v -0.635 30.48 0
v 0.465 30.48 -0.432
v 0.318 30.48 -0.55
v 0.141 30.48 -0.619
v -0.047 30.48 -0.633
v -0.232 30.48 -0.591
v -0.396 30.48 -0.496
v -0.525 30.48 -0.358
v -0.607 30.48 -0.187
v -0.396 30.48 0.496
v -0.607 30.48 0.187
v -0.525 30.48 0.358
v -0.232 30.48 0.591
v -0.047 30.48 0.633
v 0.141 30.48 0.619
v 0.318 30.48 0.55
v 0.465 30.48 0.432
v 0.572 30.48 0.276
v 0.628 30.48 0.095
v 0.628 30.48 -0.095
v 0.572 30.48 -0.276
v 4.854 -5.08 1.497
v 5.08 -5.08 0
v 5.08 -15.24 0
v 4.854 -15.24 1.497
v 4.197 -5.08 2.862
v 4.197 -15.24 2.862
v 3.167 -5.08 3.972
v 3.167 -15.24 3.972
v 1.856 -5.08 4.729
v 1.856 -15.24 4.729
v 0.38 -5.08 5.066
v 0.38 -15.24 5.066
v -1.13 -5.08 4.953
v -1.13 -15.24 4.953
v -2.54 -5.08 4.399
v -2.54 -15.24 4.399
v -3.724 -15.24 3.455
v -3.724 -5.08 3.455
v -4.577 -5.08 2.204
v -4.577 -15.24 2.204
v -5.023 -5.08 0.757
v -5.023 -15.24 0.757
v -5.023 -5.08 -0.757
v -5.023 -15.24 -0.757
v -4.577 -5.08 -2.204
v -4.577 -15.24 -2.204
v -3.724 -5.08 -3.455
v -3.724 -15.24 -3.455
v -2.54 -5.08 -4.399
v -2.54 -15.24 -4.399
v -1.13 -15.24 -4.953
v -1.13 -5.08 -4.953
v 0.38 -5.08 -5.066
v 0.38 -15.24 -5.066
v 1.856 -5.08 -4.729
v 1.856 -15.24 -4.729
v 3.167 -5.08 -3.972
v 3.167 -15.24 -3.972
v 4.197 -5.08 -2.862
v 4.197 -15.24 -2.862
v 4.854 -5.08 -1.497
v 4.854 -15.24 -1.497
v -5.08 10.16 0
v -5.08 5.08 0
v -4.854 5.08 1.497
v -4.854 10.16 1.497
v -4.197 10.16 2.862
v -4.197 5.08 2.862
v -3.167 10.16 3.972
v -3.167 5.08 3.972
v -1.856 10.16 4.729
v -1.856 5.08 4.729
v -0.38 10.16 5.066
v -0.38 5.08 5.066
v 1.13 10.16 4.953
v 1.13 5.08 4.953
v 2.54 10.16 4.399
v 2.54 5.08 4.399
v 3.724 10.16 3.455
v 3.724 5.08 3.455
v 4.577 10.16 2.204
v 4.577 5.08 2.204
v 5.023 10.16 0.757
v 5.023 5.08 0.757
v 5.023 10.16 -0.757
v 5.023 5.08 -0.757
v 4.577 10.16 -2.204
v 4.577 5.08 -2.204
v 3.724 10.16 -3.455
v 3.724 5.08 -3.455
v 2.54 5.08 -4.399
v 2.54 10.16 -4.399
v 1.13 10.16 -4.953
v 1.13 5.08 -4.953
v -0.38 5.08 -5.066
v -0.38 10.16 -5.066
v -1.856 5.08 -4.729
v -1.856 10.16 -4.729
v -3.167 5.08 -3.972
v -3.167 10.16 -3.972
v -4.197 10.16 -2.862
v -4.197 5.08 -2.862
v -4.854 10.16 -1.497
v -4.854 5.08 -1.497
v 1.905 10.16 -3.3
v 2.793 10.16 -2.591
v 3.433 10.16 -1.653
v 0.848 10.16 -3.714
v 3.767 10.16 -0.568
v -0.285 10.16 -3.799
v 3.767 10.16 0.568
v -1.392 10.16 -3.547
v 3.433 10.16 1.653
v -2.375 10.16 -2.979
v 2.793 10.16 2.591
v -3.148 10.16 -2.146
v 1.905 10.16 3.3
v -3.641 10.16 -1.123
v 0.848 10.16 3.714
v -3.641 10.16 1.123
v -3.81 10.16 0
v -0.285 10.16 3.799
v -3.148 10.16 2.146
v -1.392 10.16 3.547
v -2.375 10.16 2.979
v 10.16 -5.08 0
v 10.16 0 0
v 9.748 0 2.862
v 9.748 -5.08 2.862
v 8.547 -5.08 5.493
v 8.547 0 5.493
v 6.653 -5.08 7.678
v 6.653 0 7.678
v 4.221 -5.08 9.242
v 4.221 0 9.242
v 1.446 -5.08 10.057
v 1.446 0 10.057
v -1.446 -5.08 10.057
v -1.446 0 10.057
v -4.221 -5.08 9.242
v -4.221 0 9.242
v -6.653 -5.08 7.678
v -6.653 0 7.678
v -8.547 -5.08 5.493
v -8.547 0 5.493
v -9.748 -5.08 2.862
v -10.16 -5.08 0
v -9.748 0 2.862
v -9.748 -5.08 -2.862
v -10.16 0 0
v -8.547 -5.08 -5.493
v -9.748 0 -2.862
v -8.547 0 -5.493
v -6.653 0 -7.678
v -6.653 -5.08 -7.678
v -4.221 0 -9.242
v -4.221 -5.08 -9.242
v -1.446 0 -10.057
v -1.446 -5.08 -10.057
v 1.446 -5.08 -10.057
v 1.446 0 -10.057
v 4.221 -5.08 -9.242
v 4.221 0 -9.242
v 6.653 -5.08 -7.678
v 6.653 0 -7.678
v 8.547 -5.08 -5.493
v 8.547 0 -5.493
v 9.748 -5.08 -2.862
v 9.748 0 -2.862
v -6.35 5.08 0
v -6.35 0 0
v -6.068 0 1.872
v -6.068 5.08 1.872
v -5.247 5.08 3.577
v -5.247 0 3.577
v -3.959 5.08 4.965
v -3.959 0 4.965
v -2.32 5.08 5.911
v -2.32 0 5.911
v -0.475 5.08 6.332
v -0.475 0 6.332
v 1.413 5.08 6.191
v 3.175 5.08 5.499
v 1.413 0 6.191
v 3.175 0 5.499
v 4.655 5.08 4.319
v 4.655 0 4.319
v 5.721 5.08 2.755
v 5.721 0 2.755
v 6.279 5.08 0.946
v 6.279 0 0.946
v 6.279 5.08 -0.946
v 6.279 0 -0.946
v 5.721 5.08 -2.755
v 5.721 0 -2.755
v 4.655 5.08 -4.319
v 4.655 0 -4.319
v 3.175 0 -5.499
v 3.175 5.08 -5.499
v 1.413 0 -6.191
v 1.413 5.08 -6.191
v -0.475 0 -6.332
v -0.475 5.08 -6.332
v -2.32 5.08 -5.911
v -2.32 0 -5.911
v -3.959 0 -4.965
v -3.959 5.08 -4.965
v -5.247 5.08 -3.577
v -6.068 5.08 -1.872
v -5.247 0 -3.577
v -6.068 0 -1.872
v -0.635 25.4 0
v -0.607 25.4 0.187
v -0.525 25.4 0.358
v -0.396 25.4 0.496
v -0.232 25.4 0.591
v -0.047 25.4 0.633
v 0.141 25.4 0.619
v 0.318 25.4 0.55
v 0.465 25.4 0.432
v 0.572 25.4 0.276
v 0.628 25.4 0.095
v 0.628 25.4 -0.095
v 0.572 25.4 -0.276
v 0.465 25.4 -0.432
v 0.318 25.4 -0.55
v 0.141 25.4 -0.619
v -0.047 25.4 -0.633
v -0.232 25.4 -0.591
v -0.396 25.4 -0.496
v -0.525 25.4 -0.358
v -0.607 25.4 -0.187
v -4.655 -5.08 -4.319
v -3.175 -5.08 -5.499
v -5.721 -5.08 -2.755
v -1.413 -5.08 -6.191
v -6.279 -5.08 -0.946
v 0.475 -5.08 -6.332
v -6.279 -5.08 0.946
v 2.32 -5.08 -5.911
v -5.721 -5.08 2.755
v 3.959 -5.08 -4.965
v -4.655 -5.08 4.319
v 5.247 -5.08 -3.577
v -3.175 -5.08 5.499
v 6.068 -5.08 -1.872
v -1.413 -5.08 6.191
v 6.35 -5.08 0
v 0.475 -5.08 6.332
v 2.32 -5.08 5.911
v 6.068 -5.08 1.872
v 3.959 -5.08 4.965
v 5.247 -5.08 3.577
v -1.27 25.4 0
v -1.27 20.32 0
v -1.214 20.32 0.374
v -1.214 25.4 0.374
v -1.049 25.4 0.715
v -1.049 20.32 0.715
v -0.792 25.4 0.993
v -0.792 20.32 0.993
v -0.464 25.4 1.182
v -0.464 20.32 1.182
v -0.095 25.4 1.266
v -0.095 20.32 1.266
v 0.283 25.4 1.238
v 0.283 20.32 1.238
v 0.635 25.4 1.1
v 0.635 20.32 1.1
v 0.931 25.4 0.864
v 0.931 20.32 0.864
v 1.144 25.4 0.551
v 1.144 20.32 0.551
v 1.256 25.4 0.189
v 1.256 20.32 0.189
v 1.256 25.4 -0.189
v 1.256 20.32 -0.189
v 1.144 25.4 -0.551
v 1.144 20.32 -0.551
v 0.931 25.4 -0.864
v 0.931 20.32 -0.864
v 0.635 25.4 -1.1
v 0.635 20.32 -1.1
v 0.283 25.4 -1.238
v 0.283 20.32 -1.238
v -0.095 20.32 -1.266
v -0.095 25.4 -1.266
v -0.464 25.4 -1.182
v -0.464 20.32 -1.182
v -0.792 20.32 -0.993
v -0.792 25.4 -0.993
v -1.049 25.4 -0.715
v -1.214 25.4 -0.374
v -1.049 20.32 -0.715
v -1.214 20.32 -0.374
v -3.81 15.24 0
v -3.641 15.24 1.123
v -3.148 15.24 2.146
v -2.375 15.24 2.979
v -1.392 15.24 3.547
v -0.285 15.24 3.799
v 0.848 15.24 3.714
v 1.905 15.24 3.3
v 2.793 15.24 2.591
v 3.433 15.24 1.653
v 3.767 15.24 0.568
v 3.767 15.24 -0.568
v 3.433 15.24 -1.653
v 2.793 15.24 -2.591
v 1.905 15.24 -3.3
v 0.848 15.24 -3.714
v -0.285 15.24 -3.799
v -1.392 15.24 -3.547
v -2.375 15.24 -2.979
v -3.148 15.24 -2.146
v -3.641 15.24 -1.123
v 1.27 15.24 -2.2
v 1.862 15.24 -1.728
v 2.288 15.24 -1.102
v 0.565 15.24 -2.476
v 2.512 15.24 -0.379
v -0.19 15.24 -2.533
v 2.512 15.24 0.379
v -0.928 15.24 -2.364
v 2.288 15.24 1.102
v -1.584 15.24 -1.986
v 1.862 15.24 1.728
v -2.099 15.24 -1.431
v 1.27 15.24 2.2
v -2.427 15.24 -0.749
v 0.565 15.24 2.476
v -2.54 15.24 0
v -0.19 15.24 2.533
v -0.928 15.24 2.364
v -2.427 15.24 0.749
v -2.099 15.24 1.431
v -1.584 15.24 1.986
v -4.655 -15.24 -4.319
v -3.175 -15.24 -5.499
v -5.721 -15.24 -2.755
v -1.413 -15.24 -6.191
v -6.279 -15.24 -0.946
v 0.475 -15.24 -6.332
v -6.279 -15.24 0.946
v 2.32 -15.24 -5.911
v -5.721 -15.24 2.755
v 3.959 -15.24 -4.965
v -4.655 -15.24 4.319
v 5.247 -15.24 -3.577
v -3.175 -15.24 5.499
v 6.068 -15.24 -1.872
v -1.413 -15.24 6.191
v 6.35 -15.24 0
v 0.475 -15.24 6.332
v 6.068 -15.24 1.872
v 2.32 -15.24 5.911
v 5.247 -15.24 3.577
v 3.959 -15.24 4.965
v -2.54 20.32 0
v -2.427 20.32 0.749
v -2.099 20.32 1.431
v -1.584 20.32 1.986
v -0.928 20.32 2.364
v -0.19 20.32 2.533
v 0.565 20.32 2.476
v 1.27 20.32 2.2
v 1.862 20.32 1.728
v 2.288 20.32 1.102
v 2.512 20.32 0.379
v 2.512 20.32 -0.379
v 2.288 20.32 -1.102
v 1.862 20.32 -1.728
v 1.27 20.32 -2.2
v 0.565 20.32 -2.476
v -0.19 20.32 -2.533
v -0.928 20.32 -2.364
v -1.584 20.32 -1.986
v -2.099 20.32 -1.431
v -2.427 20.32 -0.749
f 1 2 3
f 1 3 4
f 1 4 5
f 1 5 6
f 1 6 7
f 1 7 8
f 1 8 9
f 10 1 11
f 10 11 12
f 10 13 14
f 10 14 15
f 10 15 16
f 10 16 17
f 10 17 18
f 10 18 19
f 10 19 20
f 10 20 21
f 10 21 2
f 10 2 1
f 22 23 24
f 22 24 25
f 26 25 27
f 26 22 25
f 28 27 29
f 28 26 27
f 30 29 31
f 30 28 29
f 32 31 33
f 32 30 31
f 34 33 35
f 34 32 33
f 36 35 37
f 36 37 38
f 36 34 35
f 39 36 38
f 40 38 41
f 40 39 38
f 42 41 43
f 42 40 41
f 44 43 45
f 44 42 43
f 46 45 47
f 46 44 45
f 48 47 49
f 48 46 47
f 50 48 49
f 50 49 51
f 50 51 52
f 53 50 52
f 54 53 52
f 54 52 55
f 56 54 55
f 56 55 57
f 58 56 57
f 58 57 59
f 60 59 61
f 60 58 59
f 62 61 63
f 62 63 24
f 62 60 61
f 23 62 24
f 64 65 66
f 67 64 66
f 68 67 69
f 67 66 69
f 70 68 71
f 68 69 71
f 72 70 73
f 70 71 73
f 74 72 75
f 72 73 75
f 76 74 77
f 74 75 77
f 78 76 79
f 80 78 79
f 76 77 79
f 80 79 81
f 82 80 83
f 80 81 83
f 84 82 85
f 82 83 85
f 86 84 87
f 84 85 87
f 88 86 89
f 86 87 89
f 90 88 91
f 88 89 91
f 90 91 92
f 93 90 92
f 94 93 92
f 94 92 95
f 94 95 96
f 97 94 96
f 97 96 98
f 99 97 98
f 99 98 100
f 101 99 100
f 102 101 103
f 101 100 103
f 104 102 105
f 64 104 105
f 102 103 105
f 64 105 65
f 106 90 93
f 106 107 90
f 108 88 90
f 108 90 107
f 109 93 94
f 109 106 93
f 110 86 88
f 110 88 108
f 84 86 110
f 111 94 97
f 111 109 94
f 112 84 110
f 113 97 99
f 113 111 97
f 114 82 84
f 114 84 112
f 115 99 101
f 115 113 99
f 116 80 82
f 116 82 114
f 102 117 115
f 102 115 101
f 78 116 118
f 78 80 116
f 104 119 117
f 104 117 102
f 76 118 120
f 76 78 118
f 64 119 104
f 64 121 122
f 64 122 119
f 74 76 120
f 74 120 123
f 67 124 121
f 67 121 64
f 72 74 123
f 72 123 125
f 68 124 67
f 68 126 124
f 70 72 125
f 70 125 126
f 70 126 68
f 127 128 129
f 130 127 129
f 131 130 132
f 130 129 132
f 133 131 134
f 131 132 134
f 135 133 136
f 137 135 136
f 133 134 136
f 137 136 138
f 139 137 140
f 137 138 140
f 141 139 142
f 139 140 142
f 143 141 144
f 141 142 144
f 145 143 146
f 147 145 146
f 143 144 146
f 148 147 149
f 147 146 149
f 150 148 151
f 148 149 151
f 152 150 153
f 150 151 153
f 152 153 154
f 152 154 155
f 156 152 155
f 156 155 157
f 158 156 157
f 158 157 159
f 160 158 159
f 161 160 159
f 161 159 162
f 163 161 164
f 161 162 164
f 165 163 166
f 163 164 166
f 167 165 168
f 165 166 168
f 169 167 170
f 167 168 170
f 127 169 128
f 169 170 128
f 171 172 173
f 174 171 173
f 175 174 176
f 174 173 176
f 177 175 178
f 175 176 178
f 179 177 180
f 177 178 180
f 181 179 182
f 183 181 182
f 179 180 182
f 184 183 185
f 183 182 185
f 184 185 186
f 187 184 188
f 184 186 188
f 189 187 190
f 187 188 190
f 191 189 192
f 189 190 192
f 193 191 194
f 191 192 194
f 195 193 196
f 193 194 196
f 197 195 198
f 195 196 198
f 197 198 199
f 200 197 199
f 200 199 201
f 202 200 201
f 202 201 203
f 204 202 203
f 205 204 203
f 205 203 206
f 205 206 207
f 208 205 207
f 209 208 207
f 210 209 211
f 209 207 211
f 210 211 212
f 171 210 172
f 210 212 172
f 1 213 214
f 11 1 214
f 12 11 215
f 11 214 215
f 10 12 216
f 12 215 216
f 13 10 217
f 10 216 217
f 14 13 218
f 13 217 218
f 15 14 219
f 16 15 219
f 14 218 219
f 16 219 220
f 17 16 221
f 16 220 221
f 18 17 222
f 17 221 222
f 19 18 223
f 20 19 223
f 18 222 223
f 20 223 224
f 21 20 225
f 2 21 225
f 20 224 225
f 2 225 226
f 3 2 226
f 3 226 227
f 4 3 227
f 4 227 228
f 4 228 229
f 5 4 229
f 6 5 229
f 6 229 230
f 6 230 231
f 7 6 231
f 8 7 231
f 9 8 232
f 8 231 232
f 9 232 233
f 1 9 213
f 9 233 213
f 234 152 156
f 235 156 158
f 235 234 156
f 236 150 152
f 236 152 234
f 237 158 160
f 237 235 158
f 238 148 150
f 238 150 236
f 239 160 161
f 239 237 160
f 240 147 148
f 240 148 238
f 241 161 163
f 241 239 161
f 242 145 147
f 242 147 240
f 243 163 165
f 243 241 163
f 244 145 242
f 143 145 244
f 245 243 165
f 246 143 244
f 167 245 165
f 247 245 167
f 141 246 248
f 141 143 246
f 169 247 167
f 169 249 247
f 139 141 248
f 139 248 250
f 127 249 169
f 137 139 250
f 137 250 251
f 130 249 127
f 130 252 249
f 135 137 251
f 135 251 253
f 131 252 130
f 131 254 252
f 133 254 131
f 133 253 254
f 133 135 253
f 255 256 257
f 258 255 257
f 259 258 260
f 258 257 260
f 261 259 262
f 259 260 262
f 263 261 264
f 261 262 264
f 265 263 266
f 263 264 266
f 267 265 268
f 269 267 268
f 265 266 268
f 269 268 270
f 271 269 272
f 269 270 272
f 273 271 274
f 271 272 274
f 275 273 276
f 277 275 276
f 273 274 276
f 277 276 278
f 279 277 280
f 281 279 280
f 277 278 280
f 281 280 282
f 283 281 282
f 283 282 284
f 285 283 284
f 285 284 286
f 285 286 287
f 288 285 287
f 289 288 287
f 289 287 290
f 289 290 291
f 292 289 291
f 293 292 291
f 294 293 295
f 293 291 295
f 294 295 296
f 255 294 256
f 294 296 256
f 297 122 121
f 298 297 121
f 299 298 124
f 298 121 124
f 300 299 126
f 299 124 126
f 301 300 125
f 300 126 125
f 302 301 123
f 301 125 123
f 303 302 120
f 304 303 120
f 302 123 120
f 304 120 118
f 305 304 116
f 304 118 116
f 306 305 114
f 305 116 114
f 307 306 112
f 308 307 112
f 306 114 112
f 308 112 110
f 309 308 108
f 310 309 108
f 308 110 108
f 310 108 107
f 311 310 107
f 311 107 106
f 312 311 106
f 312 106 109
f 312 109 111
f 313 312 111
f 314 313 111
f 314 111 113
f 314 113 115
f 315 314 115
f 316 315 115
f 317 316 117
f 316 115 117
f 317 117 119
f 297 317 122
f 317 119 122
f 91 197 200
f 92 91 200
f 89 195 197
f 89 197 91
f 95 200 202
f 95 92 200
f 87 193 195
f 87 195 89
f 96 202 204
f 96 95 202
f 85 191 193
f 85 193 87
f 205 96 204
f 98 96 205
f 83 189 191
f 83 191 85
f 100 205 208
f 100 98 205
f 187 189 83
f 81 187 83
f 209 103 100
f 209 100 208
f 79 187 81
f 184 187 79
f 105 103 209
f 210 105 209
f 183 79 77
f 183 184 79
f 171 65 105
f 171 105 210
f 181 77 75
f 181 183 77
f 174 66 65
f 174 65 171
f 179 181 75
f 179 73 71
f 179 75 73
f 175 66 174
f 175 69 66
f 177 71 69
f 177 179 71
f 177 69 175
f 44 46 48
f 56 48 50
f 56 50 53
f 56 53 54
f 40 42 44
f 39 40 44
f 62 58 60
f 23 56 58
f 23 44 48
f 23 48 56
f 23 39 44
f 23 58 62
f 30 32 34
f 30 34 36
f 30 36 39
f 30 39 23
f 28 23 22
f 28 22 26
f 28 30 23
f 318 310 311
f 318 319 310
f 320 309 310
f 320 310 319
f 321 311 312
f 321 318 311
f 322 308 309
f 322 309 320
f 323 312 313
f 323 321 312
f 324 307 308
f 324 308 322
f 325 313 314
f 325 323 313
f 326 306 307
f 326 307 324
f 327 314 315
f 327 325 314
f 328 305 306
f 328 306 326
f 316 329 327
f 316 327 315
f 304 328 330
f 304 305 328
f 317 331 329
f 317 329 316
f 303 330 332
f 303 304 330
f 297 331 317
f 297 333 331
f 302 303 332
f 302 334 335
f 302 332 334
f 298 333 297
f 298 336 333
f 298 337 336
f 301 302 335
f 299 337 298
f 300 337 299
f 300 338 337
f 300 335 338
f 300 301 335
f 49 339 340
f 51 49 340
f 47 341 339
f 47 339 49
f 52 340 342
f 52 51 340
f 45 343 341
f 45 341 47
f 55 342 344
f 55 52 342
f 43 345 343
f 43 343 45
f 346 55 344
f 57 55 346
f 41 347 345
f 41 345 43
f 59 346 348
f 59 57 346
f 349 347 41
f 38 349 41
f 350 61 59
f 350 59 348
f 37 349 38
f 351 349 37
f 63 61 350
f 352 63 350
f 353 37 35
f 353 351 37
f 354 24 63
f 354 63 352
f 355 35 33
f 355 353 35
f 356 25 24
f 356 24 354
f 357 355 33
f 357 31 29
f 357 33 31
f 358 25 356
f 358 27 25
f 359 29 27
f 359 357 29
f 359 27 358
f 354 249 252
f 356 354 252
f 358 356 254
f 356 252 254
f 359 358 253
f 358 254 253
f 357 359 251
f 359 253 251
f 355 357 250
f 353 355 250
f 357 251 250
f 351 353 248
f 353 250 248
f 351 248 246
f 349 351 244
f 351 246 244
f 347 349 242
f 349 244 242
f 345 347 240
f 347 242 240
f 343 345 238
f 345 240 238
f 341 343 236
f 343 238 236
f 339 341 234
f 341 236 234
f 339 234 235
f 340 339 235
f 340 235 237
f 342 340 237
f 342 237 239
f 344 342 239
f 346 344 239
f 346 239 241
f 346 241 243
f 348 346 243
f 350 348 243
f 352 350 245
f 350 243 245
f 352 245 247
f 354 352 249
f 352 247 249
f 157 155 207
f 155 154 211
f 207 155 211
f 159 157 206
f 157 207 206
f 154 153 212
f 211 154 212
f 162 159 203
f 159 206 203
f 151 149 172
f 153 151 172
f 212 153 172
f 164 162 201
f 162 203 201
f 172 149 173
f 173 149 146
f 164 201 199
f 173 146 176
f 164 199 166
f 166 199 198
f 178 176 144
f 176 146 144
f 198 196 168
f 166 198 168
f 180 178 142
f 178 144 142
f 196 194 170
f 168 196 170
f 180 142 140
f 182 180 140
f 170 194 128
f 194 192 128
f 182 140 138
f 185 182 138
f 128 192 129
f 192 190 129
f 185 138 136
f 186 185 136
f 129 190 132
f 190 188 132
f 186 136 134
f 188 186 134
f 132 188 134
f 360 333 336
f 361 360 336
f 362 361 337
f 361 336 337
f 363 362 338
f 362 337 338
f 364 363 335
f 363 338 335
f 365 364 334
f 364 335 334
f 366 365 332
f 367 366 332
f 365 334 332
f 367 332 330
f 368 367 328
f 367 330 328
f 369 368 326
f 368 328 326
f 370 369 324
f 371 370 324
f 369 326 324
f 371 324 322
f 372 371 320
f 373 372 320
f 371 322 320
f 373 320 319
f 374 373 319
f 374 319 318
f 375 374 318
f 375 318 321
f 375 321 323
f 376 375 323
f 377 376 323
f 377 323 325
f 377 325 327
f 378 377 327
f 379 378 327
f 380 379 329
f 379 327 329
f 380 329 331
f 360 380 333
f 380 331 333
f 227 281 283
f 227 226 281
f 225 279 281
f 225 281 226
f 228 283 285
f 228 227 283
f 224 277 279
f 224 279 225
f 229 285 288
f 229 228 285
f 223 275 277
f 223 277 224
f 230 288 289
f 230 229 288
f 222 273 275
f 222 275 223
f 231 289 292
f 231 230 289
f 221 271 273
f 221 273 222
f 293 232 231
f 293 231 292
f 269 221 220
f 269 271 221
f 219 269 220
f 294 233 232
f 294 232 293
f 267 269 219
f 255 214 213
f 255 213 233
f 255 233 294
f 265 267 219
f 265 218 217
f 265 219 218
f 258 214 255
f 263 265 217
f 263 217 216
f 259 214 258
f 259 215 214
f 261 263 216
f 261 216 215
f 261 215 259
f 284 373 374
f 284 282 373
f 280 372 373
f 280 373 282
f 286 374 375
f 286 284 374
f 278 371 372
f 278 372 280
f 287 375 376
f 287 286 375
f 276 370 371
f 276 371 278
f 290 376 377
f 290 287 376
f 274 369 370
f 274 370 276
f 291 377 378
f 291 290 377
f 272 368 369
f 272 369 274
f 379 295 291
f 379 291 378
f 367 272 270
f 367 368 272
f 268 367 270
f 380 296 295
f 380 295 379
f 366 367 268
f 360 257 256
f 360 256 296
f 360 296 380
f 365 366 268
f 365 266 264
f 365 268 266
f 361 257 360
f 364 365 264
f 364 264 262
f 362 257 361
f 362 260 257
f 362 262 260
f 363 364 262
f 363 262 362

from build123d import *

# Parameters (mm, degrees)
F0_R      = 10.16
F1_DEPTH  = 5.08
F2_R      = 6.35
F2_R_2    = 5.08
F3_DEPTH  = 10.16
F4_R      = 6.35
F5_DEPTH  = 5.08
F6_R      = 5.08
F7_DEPTH  = 5.08
F8_R      = 3.81
F9_DEPTH  = 5.08
F10_R     = 2.54
F11_DEPTH = 5.08
F12_R     = 1.27
F13_DEPTH = 5.08
F14_R     = 0.635
F15_DEPTH = 5.08


with BuildPart() as f1:
    # F0 (on Front) → F1 (new body)
    with BuildSketch(Plane.XZ):
        Circle(F0_R)
    extrude(amount=F1_DEPTH)

    # F2 (on face) → F3 (join)
    with BuildSketch(Plane.XZ.offset(5.08)):
        Circle(F2_R)
        Circle(F2_R_2, mode=Mode.SUBTRACT)
    extrude(amount=F3_DEPTH)

    # F4 (on face) → F5 (join)
    with BuildSketch(Plane(origin=(0, 0, 0), x_dir=(-1, 0, 0), z_dir=(0, 1, 0))):
        Circle(F4_R)
    extrude(amount=F5_DEPTH)

    # F6 (on face) → F7 (join)
    with BuildSketch(Plane(origin=(0, 5.08, 0), x_dir=(-1, 0, 0), z_dir=(0, 1, 0))):
        Circle(F6_R)
    extrude(amount=F7_DEPTH)

    # F8 (on face) → F9 (join)
    with BuildSketch(Plane(origin=(0, 10.16, 0), x_dir=(-1, 0, 0), z_dir=(0, 1, 0))):
        Circle(F8_R)
    extrude(amount=F9_DEPTH)

    # F10 (on face) → F11 (join)
    with BuildSketch(Plane(origin=(0, 15.24, 0), x_dir=(-1, 0, 0), z_dir=(0, 1, 0))):
        Circle(F10_R)
    extrude(amount=F11_DEPTH)

    # F12 (on face) → F13 (join)
    with BuildSketch(Plane(origin=(0, 20.32, 0), x_dir=(-1, 0, 0), z_dir=(0, 1, 0))):
        Circle(F12_R)
    extrude(amount=F13_DEPTH)

    # F14 (on face) → F15 (join)
    with BuildSketch(Plane(origin=(0, 25.4, 0), x_dir=(-1, 0, 0), z_dir=(0, 1, 0))):
        Circle(F14_R)
    extrude(amount=F15_DEPTH)


solid = f1.part
